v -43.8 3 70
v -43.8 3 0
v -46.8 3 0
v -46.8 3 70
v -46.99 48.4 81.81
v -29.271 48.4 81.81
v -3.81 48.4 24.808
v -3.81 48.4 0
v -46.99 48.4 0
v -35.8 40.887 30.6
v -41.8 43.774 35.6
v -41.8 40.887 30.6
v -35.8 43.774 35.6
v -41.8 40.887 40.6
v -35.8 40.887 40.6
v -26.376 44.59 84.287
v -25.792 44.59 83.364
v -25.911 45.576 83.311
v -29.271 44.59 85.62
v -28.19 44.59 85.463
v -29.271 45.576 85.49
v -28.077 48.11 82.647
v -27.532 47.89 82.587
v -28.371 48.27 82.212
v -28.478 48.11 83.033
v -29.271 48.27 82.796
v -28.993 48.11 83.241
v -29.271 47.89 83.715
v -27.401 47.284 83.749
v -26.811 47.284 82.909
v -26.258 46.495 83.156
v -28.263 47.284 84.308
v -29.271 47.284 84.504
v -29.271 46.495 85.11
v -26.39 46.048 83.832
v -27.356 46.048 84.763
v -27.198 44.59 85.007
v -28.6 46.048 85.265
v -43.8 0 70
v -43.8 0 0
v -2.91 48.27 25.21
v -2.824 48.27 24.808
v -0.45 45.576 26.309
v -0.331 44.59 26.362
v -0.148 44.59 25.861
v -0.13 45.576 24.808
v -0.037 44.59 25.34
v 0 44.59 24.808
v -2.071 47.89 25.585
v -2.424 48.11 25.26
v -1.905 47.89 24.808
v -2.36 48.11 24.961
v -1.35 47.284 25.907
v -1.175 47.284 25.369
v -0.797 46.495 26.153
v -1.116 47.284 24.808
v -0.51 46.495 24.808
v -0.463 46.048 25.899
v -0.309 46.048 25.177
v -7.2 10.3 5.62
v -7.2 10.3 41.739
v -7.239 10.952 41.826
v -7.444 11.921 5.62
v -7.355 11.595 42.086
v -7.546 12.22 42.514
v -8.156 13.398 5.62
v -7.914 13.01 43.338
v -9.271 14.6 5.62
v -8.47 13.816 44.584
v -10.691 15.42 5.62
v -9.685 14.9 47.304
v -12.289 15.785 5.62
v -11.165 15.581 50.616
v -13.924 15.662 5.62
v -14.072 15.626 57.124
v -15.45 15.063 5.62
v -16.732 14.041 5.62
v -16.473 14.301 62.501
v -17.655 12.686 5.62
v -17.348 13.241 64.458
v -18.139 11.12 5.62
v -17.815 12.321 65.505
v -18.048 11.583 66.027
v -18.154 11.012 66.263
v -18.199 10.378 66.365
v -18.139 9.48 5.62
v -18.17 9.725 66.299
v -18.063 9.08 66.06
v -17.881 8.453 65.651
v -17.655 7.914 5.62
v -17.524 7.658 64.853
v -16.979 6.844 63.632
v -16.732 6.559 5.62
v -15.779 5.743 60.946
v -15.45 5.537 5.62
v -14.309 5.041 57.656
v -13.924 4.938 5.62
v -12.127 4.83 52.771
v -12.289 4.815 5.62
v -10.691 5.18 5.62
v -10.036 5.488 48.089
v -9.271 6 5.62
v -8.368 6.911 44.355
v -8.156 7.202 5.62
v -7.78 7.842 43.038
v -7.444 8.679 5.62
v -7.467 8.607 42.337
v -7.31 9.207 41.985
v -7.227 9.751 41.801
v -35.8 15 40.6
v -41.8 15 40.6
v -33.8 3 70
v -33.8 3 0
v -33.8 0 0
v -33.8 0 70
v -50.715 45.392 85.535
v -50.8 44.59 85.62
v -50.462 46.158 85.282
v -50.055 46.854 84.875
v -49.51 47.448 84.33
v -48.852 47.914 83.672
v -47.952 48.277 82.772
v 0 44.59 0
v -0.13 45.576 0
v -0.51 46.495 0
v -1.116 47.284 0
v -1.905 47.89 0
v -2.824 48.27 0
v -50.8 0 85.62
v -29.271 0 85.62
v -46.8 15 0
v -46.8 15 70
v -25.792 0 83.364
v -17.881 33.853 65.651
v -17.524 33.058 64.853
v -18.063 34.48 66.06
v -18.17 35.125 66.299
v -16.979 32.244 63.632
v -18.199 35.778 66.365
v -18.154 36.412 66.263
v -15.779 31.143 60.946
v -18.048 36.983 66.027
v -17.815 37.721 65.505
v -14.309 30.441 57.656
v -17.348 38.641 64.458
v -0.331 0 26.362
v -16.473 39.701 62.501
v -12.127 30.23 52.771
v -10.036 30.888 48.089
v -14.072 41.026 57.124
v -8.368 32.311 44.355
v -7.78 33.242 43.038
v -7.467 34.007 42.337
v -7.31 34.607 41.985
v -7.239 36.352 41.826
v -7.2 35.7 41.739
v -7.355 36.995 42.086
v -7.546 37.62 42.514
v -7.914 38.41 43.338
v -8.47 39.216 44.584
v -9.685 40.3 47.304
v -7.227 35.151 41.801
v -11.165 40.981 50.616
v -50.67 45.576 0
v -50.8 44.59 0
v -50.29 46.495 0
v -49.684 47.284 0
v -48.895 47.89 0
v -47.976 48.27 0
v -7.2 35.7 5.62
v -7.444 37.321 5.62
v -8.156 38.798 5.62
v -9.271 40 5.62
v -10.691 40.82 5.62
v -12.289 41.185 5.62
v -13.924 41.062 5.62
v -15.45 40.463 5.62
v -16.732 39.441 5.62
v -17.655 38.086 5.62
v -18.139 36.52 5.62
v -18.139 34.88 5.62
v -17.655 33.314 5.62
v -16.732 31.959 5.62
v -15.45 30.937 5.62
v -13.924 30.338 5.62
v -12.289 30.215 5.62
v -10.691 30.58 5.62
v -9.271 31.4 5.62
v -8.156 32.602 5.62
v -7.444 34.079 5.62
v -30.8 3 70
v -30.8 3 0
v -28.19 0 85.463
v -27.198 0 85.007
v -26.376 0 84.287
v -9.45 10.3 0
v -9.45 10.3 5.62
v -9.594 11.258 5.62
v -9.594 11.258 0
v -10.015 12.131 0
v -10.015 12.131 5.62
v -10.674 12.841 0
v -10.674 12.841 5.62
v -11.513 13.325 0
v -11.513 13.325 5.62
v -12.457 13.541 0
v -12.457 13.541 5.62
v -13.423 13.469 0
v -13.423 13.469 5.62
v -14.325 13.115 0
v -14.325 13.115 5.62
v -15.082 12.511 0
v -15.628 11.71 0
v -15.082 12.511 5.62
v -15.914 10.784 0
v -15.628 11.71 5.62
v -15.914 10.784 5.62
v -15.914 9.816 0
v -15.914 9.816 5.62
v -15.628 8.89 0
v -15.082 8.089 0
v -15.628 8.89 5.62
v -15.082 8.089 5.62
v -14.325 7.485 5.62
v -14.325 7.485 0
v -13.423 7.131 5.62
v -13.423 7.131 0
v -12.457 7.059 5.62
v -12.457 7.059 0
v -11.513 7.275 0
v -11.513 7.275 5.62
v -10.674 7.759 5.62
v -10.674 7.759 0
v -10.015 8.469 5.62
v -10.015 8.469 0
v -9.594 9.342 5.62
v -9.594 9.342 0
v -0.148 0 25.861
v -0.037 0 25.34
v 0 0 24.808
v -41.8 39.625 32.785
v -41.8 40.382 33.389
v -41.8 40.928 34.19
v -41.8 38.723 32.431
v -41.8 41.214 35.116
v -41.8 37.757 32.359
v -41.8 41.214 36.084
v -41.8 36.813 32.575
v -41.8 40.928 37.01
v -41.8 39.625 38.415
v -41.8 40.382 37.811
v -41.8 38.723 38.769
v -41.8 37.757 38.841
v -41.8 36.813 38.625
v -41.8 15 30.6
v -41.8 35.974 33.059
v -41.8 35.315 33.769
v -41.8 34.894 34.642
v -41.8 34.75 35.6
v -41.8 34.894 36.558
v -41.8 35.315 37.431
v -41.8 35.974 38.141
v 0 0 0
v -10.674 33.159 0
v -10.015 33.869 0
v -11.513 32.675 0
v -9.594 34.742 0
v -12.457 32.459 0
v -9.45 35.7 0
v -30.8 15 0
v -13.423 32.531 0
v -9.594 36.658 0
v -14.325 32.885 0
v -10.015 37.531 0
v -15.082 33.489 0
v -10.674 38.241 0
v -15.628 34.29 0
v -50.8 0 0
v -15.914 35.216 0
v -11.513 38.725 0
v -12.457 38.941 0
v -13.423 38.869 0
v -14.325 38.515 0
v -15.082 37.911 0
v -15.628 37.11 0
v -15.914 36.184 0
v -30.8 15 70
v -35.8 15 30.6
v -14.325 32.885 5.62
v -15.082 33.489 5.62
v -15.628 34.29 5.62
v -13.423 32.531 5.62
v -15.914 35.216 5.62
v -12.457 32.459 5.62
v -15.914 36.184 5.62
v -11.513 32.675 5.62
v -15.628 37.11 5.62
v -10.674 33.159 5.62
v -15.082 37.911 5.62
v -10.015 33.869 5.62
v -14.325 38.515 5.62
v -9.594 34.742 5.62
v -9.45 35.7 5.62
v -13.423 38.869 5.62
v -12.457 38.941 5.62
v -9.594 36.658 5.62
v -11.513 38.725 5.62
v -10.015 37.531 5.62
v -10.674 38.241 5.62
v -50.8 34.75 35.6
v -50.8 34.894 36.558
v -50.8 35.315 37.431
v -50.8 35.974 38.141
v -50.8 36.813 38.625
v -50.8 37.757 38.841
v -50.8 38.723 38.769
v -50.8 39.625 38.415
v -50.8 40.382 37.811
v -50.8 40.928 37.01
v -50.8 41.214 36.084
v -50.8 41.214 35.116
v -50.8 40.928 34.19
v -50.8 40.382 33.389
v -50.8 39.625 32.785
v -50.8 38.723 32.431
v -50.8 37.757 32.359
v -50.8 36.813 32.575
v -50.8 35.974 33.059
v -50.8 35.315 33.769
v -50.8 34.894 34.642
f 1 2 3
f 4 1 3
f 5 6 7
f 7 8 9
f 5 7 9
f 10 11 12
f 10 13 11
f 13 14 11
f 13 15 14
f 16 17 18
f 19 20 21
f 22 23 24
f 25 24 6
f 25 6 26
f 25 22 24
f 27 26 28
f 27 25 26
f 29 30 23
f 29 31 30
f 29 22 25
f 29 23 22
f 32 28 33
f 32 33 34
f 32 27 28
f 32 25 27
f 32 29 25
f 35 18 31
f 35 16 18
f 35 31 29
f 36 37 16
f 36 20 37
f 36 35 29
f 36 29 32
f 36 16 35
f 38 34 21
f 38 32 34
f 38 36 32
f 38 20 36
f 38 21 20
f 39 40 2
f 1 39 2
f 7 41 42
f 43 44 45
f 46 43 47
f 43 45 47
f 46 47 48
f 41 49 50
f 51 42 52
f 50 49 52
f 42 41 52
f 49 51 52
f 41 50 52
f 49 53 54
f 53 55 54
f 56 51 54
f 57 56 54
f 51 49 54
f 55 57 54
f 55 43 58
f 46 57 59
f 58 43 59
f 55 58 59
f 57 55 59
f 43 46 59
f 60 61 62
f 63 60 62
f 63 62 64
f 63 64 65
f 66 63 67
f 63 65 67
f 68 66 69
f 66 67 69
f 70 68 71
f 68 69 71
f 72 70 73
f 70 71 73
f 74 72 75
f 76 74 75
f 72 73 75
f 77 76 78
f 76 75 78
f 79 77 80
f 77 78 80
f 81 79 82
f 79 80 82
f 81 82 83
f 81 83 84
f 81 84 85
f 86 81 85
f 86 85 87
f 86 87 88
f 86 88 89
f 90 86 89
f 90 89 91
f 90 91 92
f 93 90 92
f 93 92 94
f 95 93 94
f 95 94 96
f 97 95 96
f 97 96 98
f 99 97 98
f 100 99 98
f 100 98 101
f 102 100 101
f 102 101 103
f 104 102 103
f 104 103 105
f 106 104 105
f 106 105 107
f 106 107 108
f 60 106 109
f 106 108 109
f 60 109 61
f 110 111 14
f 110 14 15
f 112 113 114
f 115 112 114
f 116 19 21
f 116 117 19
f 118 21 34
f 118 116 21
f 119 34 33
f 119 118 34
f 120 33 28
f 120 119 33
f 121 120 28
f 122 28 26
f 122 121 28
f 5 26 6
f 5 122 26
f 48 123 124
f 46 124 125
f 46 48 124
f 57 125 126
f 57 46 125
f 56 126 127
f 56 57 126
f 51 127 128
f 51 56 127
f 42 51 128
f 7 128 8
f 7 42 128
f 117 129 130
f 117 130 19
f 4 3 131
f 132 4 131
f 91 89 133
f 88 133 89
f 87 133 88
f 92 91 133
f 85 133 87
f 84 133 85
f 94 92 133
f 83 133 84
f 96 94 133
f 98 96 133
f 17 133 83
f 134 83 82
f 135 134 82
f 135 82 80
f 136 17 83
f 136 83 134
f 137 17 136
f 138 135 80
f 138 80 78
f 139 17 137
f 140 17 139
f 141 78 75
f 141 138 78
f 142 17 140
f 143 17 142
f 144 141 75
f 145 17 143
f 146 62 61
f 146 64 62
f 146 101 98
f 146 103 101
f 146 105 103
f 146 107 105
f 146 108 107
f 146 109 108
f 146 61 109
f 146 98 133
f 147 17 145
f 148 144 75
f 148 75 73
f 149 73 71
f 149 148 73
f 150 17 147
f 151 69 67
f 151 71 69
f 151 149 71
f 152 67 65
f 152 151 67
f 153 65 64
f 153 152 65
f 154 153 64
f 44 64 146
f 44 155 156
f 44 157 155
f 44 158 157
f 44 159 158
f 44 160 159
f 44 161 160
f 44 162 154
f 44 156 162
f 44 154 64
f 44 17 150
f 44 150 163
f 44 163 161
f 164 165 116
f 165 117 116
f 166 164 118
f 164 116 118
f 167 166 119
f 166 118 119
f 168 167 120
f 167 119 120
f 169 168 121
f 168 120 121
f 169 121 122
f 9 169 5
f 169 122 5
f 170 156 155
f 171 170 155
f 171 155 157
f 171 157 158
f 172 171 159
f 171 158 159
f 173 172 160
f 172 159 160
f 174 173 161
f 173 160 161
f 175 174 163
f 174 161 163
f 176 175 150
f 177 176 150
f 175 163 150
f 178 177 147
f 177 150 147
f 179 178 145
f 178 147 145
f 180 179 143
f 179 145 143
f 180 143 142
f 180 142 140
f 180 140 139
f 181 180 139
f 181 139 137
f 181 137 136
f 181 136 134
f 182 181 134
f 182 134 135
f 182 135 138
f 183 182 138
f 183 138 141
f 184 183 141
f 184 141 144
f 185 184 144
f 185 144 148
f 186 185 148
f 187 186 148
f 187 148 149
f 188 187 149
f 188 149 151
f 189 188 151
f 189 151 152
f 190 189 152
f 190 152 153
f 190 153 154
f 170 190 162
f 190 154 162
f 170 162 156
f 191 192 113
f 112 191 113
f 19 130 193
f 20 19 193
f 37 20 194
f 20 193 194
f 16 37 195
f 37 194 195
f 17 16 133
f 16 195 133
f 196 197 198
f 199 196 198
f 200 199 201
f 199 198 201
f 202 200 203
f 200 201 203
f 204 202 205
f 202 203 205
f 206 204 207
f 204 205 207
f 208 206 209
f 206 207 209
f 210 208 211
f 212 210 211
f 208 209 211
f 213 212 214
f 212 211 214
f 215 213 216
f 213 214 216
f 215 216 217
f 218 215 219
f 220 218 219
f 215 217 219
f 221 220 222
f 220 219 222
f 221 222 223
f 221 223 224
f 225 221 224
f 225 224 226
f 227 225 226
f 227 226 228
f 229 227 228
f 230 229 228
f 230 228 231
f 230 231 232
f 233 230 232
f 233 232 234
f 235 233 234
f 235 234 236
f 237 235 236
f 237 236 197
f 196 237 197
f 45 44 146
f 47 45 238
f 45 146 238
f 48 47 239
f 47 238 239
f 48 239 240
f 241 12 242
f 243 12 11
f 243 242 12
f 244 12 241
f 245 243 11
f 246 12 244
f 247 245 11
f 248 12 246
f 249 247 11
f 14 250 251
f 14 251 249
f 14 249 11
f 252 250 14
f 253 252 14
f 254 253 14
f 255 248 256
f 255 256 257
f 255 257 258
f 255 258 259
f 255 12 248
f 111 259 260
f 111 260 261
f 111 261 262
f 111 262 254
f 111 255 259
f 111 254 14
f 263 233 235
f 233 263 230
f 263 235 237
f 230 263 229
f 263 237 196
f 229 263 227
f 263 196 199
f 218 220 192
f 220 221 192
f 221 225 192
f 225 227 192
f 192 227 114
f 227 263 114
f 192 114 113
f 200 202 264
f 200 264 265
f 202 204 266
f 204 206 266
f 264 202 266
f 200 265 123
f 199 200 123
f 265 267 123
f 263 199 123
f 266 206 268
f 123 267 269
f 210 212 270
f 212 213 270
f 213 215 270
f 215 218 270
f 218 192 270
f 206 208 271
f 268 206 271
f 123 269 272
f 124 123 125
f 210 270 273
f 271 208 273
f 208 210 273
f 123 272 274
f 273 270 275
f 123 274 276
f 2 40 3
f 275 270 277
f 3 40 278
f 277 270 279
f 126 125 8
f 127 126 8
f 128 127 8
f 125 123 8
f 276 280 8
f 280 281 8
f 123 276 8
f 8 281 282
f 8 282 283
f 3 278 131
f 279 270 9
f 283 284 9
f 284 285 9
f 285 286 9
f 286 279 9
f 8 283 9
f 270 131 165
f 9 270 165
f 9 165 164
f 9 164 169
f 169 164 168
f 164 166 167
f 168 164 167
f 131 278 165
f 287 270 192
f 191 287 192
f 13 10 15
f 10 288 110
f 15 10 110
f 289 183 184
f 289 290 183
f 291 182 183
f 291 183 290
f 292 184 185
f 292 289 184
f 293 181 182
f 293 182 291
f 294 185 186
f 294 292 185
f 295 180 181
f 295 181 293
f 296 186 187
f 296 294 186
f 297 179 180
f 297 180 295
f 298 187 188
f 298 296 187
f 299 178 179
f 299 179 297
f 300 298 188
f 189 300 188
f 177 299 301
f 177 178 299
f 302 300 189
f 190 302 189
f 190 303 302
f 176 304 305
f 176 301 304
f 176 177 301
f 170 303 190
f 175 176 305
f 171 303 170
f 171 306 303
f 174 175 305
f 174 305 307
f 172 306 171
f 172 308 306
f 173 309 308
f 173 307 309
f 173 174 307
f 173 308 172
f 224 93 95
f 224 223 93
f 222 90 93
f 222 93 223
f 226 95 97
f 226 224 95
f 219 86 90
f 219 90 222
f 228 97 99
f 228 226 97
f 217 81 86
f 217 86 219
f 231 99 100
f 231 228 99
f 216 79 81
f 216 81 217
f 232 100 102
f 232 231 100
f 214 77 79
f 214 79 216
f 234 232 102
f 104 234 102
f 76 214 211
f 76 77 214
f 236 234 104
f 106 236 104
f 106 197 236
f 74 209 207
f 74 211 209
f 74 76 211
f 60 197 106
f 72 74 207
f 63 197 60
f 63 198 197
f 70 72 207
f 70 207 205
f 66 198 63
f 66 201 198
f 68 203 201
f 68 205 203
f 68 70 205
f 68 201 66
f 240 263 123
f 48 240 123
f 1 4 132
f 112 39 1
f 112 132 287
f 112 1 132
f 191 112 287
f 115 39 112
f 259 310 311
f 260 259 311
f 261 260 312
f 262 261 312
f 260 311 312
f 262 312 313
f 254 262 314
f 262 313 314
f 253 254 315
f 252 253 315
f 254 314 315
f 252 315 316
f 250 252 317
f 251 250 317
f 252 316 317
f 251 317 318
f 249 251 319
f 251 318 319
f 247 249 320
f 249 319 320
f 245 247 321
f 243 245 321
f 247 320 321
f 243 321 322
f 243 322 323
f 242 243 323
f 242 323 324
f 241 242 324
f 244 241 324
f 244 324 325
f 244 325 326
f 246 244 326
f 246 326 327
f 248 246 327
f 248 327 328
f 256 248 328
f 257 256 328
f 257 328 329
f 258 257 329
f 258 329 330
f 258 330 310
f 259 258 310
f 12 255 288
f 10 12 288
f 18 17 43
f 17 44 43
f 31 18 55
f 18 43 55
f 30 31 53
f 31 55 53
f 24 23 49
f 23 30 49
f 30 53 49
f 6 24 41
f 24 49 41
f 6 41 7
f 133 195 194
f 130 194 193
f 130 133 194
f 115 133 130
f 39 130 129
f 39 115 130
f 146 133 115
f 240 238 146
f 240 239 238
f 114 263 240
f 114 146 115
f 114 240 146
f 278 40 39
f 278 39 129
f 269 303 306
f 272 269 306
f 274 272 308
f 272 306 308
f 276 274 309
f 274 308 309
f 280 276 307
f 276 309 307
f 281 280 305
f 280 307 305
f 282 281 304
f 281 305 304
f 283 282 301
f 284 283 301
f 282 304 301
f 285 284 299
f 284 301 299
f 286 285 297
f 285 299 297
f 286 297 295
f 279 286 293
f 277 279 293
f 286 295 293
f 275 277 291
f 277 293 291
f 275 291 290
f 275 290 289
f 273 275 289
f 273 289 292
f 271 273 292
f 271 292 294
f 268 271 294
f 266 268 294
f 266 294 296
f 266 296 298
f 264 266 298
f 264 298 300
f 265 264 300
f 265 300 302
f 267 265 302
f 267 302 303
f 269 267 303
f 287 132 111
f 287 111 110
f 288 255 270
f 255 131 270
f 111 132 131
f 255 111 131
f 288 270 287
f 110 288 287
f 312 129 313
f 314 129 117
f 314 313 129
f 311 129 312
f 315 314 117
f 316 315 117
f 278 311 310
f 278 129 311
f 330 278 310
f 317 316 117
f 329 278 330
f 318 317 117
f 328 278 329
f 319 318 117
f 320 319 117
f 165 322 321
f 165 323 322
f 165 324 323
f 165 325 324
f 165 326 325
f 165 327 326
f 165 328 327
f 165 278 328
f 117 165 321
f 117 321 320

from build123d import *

# Parameters (mm, degrees)
SKETCH1_W               = 48.4
SKETCH1_H               = 50.8
BOSS_EXTRUDE1_DEPTH     = 85.62
CUT_EXTRUDE1_DEPTH      = 49.4
CUT_EXTRUDE2_DEPTH      = 70
SKETCH5_R               = 5.5
CUT_EXTRUDE3_DEPTH      = 80
SKETCH6_R               = 3.25
CUT_EXTRUDE4_DEPTH      = 6.62
CUT_EXTRUDE5_DEPTH      = 3
CUT_EXTRUDE5_DEPTH_BACK = 3
CUT_EXTRUDE6_REACH      = 35.4
SKETCH8_W               = 6
SKETCH8_H               = 10
CUT_EXTRUDE7_REACH      = 52.8
SKETCH4_R               = 3.25
FILLET1_R               = 3.81


with BuildPart() as part:
    # Sketch1 → Boss-Extrude1 (new body)
    with BuildSketch(Plane(origin=(0, 0, 0), x_dir=(0, 1, 0), z_dir=(0, 0, 1))):
        with Locations((24.2, 25.4)):
            Rectangle(SKETCH1_W, SKETCH1_H)
    extrude(amount=BOSS_EXTRUDE1_DEPTH)

    # Sketch2 → Cut-Extrude1 (cut, through all)
    with BuildSketch(Plane(origin=(0, 48.4, 0), x_dir=(-1, 0, 0), z_dir=(0, 1, 0))):
        Polygon((26.8, 85.62), (0, 25.62), (0, 85.62), align=None)
    extrude(amount=-CUT_EXTRUDE1_DEPTH, mode=Mode.SUBTRACT)

    # Sketch3 → Cut-Extrude2 (cut)
    with BuildSketch(Plane(origin=(0, 0, 0), x_dir=(1, 0, 0), z_dir=(0, 0, -1))):
        Polygon((-43.8, 0), (-43.8, -3), (-46.8, -3), (-46.8, -15), (-30.8, -15), (-30.8, -3), (-33.8, -3), (-33.8, 0), align=None)
    extrude(amount=-CUT_EXTRUDE2_DEPTH, mode=Mode.SUBTRACT)

    # Sketch5 → Cut-Extrude3 (cut)
    with BuildSketch(Plane.XY.offset(85.62)):
        with Locations((-12.7, 10.3)):
            Circle(SKETCH5_R)
        with Locations((-12.7, 35.7)):
            Circle(SKETCH5_R)
    extrude(amount=-CUT_EXTRUDE3_DEPTH, mode=Mode.SUBTRACT)

    # Sketch6 → Cut-Extrude4 (cut, through all)
    with BuildSketch(Plane.XY.offset(5.62)):
        with Locations((-12.7, 35.7)):
            Circle(SKETCH6_R)
        with Locations((-12.7, 10.3)):
            Circle(SKETCH6_R)
    extrude(amount=-CUT_EXTRUDE4_DEPTH, mode=Mode.SUBTRACT)

    # Sketch7 → Cut-Extrude5 (cut, two sides)
    with BuildSketch(Plane.ZY.offset(38.8)) as cut_extrude5_sk:
        Polygon((35.6, 43.773502692), (30.6, 40.886751346), (30.6, 35.113248654), (35.6, 32.226497308), (40.6, 35.113248654), (40.6, 40.886751346), align=None)
    extrude(amount=CUT_EXTRUDE5_DEPTH, mode=Mode.SUBTRACT)
    extrude(cut_extrude5_sk.sketch, amount=-CUT_EXTRUDE5_DEPTH_BACK, mode=Mode.SUBTRACT)

    # Sketch8 → Cut-Extrude6 (cut, up to next)
    with BuildSketch(Plane.XZ.offset(-15), mode=Mode.PRIVATE) as cut_extrude6_sk1:
        with Locations((-38.8, 35.6)):
            Rectangle(SKETCH8_W, SKETCH8_H)
    cut_extrude6_tool1 = extrude(cut_extrude6_sk1.sketch, amount=-CUT_EXTRUDE6_REACH, mode=Mode.PRIVATE) & part.part
    add(cut_extrude6_tool1.solids().sort_by_distance((-38.8, 15, 35.6))[0], mode=Mode.SUBTRACT)

    # Sketch4 → Cut-Extrude7 (cut, up to next)
    with BuildSketch(Plane(origin=(-50.8, 0, 0), x_dir=(0, -1, 0), z_dir=(-1, 0, 0)), mode=Mode.PRIVATE) as cut_extrude7_sk1:
        with Locations((-38, 35.6)):
            Circle(SKETCH4_R)
    cut_extrude7_tool1 = extrude(cut_extrude7_sk1.sketch, amount=-CUT_EXTRUDE7_REACH, mode=Mode.PRIVATE) & part.part
    add(cut_extrude7_tool1.solids().sort_by_distance((-50.8, 38, 35.6))[0], mode=Mode.SUBTRACT)

    # Fillet1
    fillet1_edges = [part.edges().sort_by_distance(p)[0] for p in [
        (-38.8, 48.4, 85.62),
        (0, 48.4, 12.81),
        (-26.8, 24.2, 85.62),
        (0, 24.2, 25.62),
        (-13.4, 48.4, 55.62),
        (-50.8, 48.4, 42.81),
    ]]
    fillet(fillet1_edges, radius=FILLET1_R)


solid = part.part
